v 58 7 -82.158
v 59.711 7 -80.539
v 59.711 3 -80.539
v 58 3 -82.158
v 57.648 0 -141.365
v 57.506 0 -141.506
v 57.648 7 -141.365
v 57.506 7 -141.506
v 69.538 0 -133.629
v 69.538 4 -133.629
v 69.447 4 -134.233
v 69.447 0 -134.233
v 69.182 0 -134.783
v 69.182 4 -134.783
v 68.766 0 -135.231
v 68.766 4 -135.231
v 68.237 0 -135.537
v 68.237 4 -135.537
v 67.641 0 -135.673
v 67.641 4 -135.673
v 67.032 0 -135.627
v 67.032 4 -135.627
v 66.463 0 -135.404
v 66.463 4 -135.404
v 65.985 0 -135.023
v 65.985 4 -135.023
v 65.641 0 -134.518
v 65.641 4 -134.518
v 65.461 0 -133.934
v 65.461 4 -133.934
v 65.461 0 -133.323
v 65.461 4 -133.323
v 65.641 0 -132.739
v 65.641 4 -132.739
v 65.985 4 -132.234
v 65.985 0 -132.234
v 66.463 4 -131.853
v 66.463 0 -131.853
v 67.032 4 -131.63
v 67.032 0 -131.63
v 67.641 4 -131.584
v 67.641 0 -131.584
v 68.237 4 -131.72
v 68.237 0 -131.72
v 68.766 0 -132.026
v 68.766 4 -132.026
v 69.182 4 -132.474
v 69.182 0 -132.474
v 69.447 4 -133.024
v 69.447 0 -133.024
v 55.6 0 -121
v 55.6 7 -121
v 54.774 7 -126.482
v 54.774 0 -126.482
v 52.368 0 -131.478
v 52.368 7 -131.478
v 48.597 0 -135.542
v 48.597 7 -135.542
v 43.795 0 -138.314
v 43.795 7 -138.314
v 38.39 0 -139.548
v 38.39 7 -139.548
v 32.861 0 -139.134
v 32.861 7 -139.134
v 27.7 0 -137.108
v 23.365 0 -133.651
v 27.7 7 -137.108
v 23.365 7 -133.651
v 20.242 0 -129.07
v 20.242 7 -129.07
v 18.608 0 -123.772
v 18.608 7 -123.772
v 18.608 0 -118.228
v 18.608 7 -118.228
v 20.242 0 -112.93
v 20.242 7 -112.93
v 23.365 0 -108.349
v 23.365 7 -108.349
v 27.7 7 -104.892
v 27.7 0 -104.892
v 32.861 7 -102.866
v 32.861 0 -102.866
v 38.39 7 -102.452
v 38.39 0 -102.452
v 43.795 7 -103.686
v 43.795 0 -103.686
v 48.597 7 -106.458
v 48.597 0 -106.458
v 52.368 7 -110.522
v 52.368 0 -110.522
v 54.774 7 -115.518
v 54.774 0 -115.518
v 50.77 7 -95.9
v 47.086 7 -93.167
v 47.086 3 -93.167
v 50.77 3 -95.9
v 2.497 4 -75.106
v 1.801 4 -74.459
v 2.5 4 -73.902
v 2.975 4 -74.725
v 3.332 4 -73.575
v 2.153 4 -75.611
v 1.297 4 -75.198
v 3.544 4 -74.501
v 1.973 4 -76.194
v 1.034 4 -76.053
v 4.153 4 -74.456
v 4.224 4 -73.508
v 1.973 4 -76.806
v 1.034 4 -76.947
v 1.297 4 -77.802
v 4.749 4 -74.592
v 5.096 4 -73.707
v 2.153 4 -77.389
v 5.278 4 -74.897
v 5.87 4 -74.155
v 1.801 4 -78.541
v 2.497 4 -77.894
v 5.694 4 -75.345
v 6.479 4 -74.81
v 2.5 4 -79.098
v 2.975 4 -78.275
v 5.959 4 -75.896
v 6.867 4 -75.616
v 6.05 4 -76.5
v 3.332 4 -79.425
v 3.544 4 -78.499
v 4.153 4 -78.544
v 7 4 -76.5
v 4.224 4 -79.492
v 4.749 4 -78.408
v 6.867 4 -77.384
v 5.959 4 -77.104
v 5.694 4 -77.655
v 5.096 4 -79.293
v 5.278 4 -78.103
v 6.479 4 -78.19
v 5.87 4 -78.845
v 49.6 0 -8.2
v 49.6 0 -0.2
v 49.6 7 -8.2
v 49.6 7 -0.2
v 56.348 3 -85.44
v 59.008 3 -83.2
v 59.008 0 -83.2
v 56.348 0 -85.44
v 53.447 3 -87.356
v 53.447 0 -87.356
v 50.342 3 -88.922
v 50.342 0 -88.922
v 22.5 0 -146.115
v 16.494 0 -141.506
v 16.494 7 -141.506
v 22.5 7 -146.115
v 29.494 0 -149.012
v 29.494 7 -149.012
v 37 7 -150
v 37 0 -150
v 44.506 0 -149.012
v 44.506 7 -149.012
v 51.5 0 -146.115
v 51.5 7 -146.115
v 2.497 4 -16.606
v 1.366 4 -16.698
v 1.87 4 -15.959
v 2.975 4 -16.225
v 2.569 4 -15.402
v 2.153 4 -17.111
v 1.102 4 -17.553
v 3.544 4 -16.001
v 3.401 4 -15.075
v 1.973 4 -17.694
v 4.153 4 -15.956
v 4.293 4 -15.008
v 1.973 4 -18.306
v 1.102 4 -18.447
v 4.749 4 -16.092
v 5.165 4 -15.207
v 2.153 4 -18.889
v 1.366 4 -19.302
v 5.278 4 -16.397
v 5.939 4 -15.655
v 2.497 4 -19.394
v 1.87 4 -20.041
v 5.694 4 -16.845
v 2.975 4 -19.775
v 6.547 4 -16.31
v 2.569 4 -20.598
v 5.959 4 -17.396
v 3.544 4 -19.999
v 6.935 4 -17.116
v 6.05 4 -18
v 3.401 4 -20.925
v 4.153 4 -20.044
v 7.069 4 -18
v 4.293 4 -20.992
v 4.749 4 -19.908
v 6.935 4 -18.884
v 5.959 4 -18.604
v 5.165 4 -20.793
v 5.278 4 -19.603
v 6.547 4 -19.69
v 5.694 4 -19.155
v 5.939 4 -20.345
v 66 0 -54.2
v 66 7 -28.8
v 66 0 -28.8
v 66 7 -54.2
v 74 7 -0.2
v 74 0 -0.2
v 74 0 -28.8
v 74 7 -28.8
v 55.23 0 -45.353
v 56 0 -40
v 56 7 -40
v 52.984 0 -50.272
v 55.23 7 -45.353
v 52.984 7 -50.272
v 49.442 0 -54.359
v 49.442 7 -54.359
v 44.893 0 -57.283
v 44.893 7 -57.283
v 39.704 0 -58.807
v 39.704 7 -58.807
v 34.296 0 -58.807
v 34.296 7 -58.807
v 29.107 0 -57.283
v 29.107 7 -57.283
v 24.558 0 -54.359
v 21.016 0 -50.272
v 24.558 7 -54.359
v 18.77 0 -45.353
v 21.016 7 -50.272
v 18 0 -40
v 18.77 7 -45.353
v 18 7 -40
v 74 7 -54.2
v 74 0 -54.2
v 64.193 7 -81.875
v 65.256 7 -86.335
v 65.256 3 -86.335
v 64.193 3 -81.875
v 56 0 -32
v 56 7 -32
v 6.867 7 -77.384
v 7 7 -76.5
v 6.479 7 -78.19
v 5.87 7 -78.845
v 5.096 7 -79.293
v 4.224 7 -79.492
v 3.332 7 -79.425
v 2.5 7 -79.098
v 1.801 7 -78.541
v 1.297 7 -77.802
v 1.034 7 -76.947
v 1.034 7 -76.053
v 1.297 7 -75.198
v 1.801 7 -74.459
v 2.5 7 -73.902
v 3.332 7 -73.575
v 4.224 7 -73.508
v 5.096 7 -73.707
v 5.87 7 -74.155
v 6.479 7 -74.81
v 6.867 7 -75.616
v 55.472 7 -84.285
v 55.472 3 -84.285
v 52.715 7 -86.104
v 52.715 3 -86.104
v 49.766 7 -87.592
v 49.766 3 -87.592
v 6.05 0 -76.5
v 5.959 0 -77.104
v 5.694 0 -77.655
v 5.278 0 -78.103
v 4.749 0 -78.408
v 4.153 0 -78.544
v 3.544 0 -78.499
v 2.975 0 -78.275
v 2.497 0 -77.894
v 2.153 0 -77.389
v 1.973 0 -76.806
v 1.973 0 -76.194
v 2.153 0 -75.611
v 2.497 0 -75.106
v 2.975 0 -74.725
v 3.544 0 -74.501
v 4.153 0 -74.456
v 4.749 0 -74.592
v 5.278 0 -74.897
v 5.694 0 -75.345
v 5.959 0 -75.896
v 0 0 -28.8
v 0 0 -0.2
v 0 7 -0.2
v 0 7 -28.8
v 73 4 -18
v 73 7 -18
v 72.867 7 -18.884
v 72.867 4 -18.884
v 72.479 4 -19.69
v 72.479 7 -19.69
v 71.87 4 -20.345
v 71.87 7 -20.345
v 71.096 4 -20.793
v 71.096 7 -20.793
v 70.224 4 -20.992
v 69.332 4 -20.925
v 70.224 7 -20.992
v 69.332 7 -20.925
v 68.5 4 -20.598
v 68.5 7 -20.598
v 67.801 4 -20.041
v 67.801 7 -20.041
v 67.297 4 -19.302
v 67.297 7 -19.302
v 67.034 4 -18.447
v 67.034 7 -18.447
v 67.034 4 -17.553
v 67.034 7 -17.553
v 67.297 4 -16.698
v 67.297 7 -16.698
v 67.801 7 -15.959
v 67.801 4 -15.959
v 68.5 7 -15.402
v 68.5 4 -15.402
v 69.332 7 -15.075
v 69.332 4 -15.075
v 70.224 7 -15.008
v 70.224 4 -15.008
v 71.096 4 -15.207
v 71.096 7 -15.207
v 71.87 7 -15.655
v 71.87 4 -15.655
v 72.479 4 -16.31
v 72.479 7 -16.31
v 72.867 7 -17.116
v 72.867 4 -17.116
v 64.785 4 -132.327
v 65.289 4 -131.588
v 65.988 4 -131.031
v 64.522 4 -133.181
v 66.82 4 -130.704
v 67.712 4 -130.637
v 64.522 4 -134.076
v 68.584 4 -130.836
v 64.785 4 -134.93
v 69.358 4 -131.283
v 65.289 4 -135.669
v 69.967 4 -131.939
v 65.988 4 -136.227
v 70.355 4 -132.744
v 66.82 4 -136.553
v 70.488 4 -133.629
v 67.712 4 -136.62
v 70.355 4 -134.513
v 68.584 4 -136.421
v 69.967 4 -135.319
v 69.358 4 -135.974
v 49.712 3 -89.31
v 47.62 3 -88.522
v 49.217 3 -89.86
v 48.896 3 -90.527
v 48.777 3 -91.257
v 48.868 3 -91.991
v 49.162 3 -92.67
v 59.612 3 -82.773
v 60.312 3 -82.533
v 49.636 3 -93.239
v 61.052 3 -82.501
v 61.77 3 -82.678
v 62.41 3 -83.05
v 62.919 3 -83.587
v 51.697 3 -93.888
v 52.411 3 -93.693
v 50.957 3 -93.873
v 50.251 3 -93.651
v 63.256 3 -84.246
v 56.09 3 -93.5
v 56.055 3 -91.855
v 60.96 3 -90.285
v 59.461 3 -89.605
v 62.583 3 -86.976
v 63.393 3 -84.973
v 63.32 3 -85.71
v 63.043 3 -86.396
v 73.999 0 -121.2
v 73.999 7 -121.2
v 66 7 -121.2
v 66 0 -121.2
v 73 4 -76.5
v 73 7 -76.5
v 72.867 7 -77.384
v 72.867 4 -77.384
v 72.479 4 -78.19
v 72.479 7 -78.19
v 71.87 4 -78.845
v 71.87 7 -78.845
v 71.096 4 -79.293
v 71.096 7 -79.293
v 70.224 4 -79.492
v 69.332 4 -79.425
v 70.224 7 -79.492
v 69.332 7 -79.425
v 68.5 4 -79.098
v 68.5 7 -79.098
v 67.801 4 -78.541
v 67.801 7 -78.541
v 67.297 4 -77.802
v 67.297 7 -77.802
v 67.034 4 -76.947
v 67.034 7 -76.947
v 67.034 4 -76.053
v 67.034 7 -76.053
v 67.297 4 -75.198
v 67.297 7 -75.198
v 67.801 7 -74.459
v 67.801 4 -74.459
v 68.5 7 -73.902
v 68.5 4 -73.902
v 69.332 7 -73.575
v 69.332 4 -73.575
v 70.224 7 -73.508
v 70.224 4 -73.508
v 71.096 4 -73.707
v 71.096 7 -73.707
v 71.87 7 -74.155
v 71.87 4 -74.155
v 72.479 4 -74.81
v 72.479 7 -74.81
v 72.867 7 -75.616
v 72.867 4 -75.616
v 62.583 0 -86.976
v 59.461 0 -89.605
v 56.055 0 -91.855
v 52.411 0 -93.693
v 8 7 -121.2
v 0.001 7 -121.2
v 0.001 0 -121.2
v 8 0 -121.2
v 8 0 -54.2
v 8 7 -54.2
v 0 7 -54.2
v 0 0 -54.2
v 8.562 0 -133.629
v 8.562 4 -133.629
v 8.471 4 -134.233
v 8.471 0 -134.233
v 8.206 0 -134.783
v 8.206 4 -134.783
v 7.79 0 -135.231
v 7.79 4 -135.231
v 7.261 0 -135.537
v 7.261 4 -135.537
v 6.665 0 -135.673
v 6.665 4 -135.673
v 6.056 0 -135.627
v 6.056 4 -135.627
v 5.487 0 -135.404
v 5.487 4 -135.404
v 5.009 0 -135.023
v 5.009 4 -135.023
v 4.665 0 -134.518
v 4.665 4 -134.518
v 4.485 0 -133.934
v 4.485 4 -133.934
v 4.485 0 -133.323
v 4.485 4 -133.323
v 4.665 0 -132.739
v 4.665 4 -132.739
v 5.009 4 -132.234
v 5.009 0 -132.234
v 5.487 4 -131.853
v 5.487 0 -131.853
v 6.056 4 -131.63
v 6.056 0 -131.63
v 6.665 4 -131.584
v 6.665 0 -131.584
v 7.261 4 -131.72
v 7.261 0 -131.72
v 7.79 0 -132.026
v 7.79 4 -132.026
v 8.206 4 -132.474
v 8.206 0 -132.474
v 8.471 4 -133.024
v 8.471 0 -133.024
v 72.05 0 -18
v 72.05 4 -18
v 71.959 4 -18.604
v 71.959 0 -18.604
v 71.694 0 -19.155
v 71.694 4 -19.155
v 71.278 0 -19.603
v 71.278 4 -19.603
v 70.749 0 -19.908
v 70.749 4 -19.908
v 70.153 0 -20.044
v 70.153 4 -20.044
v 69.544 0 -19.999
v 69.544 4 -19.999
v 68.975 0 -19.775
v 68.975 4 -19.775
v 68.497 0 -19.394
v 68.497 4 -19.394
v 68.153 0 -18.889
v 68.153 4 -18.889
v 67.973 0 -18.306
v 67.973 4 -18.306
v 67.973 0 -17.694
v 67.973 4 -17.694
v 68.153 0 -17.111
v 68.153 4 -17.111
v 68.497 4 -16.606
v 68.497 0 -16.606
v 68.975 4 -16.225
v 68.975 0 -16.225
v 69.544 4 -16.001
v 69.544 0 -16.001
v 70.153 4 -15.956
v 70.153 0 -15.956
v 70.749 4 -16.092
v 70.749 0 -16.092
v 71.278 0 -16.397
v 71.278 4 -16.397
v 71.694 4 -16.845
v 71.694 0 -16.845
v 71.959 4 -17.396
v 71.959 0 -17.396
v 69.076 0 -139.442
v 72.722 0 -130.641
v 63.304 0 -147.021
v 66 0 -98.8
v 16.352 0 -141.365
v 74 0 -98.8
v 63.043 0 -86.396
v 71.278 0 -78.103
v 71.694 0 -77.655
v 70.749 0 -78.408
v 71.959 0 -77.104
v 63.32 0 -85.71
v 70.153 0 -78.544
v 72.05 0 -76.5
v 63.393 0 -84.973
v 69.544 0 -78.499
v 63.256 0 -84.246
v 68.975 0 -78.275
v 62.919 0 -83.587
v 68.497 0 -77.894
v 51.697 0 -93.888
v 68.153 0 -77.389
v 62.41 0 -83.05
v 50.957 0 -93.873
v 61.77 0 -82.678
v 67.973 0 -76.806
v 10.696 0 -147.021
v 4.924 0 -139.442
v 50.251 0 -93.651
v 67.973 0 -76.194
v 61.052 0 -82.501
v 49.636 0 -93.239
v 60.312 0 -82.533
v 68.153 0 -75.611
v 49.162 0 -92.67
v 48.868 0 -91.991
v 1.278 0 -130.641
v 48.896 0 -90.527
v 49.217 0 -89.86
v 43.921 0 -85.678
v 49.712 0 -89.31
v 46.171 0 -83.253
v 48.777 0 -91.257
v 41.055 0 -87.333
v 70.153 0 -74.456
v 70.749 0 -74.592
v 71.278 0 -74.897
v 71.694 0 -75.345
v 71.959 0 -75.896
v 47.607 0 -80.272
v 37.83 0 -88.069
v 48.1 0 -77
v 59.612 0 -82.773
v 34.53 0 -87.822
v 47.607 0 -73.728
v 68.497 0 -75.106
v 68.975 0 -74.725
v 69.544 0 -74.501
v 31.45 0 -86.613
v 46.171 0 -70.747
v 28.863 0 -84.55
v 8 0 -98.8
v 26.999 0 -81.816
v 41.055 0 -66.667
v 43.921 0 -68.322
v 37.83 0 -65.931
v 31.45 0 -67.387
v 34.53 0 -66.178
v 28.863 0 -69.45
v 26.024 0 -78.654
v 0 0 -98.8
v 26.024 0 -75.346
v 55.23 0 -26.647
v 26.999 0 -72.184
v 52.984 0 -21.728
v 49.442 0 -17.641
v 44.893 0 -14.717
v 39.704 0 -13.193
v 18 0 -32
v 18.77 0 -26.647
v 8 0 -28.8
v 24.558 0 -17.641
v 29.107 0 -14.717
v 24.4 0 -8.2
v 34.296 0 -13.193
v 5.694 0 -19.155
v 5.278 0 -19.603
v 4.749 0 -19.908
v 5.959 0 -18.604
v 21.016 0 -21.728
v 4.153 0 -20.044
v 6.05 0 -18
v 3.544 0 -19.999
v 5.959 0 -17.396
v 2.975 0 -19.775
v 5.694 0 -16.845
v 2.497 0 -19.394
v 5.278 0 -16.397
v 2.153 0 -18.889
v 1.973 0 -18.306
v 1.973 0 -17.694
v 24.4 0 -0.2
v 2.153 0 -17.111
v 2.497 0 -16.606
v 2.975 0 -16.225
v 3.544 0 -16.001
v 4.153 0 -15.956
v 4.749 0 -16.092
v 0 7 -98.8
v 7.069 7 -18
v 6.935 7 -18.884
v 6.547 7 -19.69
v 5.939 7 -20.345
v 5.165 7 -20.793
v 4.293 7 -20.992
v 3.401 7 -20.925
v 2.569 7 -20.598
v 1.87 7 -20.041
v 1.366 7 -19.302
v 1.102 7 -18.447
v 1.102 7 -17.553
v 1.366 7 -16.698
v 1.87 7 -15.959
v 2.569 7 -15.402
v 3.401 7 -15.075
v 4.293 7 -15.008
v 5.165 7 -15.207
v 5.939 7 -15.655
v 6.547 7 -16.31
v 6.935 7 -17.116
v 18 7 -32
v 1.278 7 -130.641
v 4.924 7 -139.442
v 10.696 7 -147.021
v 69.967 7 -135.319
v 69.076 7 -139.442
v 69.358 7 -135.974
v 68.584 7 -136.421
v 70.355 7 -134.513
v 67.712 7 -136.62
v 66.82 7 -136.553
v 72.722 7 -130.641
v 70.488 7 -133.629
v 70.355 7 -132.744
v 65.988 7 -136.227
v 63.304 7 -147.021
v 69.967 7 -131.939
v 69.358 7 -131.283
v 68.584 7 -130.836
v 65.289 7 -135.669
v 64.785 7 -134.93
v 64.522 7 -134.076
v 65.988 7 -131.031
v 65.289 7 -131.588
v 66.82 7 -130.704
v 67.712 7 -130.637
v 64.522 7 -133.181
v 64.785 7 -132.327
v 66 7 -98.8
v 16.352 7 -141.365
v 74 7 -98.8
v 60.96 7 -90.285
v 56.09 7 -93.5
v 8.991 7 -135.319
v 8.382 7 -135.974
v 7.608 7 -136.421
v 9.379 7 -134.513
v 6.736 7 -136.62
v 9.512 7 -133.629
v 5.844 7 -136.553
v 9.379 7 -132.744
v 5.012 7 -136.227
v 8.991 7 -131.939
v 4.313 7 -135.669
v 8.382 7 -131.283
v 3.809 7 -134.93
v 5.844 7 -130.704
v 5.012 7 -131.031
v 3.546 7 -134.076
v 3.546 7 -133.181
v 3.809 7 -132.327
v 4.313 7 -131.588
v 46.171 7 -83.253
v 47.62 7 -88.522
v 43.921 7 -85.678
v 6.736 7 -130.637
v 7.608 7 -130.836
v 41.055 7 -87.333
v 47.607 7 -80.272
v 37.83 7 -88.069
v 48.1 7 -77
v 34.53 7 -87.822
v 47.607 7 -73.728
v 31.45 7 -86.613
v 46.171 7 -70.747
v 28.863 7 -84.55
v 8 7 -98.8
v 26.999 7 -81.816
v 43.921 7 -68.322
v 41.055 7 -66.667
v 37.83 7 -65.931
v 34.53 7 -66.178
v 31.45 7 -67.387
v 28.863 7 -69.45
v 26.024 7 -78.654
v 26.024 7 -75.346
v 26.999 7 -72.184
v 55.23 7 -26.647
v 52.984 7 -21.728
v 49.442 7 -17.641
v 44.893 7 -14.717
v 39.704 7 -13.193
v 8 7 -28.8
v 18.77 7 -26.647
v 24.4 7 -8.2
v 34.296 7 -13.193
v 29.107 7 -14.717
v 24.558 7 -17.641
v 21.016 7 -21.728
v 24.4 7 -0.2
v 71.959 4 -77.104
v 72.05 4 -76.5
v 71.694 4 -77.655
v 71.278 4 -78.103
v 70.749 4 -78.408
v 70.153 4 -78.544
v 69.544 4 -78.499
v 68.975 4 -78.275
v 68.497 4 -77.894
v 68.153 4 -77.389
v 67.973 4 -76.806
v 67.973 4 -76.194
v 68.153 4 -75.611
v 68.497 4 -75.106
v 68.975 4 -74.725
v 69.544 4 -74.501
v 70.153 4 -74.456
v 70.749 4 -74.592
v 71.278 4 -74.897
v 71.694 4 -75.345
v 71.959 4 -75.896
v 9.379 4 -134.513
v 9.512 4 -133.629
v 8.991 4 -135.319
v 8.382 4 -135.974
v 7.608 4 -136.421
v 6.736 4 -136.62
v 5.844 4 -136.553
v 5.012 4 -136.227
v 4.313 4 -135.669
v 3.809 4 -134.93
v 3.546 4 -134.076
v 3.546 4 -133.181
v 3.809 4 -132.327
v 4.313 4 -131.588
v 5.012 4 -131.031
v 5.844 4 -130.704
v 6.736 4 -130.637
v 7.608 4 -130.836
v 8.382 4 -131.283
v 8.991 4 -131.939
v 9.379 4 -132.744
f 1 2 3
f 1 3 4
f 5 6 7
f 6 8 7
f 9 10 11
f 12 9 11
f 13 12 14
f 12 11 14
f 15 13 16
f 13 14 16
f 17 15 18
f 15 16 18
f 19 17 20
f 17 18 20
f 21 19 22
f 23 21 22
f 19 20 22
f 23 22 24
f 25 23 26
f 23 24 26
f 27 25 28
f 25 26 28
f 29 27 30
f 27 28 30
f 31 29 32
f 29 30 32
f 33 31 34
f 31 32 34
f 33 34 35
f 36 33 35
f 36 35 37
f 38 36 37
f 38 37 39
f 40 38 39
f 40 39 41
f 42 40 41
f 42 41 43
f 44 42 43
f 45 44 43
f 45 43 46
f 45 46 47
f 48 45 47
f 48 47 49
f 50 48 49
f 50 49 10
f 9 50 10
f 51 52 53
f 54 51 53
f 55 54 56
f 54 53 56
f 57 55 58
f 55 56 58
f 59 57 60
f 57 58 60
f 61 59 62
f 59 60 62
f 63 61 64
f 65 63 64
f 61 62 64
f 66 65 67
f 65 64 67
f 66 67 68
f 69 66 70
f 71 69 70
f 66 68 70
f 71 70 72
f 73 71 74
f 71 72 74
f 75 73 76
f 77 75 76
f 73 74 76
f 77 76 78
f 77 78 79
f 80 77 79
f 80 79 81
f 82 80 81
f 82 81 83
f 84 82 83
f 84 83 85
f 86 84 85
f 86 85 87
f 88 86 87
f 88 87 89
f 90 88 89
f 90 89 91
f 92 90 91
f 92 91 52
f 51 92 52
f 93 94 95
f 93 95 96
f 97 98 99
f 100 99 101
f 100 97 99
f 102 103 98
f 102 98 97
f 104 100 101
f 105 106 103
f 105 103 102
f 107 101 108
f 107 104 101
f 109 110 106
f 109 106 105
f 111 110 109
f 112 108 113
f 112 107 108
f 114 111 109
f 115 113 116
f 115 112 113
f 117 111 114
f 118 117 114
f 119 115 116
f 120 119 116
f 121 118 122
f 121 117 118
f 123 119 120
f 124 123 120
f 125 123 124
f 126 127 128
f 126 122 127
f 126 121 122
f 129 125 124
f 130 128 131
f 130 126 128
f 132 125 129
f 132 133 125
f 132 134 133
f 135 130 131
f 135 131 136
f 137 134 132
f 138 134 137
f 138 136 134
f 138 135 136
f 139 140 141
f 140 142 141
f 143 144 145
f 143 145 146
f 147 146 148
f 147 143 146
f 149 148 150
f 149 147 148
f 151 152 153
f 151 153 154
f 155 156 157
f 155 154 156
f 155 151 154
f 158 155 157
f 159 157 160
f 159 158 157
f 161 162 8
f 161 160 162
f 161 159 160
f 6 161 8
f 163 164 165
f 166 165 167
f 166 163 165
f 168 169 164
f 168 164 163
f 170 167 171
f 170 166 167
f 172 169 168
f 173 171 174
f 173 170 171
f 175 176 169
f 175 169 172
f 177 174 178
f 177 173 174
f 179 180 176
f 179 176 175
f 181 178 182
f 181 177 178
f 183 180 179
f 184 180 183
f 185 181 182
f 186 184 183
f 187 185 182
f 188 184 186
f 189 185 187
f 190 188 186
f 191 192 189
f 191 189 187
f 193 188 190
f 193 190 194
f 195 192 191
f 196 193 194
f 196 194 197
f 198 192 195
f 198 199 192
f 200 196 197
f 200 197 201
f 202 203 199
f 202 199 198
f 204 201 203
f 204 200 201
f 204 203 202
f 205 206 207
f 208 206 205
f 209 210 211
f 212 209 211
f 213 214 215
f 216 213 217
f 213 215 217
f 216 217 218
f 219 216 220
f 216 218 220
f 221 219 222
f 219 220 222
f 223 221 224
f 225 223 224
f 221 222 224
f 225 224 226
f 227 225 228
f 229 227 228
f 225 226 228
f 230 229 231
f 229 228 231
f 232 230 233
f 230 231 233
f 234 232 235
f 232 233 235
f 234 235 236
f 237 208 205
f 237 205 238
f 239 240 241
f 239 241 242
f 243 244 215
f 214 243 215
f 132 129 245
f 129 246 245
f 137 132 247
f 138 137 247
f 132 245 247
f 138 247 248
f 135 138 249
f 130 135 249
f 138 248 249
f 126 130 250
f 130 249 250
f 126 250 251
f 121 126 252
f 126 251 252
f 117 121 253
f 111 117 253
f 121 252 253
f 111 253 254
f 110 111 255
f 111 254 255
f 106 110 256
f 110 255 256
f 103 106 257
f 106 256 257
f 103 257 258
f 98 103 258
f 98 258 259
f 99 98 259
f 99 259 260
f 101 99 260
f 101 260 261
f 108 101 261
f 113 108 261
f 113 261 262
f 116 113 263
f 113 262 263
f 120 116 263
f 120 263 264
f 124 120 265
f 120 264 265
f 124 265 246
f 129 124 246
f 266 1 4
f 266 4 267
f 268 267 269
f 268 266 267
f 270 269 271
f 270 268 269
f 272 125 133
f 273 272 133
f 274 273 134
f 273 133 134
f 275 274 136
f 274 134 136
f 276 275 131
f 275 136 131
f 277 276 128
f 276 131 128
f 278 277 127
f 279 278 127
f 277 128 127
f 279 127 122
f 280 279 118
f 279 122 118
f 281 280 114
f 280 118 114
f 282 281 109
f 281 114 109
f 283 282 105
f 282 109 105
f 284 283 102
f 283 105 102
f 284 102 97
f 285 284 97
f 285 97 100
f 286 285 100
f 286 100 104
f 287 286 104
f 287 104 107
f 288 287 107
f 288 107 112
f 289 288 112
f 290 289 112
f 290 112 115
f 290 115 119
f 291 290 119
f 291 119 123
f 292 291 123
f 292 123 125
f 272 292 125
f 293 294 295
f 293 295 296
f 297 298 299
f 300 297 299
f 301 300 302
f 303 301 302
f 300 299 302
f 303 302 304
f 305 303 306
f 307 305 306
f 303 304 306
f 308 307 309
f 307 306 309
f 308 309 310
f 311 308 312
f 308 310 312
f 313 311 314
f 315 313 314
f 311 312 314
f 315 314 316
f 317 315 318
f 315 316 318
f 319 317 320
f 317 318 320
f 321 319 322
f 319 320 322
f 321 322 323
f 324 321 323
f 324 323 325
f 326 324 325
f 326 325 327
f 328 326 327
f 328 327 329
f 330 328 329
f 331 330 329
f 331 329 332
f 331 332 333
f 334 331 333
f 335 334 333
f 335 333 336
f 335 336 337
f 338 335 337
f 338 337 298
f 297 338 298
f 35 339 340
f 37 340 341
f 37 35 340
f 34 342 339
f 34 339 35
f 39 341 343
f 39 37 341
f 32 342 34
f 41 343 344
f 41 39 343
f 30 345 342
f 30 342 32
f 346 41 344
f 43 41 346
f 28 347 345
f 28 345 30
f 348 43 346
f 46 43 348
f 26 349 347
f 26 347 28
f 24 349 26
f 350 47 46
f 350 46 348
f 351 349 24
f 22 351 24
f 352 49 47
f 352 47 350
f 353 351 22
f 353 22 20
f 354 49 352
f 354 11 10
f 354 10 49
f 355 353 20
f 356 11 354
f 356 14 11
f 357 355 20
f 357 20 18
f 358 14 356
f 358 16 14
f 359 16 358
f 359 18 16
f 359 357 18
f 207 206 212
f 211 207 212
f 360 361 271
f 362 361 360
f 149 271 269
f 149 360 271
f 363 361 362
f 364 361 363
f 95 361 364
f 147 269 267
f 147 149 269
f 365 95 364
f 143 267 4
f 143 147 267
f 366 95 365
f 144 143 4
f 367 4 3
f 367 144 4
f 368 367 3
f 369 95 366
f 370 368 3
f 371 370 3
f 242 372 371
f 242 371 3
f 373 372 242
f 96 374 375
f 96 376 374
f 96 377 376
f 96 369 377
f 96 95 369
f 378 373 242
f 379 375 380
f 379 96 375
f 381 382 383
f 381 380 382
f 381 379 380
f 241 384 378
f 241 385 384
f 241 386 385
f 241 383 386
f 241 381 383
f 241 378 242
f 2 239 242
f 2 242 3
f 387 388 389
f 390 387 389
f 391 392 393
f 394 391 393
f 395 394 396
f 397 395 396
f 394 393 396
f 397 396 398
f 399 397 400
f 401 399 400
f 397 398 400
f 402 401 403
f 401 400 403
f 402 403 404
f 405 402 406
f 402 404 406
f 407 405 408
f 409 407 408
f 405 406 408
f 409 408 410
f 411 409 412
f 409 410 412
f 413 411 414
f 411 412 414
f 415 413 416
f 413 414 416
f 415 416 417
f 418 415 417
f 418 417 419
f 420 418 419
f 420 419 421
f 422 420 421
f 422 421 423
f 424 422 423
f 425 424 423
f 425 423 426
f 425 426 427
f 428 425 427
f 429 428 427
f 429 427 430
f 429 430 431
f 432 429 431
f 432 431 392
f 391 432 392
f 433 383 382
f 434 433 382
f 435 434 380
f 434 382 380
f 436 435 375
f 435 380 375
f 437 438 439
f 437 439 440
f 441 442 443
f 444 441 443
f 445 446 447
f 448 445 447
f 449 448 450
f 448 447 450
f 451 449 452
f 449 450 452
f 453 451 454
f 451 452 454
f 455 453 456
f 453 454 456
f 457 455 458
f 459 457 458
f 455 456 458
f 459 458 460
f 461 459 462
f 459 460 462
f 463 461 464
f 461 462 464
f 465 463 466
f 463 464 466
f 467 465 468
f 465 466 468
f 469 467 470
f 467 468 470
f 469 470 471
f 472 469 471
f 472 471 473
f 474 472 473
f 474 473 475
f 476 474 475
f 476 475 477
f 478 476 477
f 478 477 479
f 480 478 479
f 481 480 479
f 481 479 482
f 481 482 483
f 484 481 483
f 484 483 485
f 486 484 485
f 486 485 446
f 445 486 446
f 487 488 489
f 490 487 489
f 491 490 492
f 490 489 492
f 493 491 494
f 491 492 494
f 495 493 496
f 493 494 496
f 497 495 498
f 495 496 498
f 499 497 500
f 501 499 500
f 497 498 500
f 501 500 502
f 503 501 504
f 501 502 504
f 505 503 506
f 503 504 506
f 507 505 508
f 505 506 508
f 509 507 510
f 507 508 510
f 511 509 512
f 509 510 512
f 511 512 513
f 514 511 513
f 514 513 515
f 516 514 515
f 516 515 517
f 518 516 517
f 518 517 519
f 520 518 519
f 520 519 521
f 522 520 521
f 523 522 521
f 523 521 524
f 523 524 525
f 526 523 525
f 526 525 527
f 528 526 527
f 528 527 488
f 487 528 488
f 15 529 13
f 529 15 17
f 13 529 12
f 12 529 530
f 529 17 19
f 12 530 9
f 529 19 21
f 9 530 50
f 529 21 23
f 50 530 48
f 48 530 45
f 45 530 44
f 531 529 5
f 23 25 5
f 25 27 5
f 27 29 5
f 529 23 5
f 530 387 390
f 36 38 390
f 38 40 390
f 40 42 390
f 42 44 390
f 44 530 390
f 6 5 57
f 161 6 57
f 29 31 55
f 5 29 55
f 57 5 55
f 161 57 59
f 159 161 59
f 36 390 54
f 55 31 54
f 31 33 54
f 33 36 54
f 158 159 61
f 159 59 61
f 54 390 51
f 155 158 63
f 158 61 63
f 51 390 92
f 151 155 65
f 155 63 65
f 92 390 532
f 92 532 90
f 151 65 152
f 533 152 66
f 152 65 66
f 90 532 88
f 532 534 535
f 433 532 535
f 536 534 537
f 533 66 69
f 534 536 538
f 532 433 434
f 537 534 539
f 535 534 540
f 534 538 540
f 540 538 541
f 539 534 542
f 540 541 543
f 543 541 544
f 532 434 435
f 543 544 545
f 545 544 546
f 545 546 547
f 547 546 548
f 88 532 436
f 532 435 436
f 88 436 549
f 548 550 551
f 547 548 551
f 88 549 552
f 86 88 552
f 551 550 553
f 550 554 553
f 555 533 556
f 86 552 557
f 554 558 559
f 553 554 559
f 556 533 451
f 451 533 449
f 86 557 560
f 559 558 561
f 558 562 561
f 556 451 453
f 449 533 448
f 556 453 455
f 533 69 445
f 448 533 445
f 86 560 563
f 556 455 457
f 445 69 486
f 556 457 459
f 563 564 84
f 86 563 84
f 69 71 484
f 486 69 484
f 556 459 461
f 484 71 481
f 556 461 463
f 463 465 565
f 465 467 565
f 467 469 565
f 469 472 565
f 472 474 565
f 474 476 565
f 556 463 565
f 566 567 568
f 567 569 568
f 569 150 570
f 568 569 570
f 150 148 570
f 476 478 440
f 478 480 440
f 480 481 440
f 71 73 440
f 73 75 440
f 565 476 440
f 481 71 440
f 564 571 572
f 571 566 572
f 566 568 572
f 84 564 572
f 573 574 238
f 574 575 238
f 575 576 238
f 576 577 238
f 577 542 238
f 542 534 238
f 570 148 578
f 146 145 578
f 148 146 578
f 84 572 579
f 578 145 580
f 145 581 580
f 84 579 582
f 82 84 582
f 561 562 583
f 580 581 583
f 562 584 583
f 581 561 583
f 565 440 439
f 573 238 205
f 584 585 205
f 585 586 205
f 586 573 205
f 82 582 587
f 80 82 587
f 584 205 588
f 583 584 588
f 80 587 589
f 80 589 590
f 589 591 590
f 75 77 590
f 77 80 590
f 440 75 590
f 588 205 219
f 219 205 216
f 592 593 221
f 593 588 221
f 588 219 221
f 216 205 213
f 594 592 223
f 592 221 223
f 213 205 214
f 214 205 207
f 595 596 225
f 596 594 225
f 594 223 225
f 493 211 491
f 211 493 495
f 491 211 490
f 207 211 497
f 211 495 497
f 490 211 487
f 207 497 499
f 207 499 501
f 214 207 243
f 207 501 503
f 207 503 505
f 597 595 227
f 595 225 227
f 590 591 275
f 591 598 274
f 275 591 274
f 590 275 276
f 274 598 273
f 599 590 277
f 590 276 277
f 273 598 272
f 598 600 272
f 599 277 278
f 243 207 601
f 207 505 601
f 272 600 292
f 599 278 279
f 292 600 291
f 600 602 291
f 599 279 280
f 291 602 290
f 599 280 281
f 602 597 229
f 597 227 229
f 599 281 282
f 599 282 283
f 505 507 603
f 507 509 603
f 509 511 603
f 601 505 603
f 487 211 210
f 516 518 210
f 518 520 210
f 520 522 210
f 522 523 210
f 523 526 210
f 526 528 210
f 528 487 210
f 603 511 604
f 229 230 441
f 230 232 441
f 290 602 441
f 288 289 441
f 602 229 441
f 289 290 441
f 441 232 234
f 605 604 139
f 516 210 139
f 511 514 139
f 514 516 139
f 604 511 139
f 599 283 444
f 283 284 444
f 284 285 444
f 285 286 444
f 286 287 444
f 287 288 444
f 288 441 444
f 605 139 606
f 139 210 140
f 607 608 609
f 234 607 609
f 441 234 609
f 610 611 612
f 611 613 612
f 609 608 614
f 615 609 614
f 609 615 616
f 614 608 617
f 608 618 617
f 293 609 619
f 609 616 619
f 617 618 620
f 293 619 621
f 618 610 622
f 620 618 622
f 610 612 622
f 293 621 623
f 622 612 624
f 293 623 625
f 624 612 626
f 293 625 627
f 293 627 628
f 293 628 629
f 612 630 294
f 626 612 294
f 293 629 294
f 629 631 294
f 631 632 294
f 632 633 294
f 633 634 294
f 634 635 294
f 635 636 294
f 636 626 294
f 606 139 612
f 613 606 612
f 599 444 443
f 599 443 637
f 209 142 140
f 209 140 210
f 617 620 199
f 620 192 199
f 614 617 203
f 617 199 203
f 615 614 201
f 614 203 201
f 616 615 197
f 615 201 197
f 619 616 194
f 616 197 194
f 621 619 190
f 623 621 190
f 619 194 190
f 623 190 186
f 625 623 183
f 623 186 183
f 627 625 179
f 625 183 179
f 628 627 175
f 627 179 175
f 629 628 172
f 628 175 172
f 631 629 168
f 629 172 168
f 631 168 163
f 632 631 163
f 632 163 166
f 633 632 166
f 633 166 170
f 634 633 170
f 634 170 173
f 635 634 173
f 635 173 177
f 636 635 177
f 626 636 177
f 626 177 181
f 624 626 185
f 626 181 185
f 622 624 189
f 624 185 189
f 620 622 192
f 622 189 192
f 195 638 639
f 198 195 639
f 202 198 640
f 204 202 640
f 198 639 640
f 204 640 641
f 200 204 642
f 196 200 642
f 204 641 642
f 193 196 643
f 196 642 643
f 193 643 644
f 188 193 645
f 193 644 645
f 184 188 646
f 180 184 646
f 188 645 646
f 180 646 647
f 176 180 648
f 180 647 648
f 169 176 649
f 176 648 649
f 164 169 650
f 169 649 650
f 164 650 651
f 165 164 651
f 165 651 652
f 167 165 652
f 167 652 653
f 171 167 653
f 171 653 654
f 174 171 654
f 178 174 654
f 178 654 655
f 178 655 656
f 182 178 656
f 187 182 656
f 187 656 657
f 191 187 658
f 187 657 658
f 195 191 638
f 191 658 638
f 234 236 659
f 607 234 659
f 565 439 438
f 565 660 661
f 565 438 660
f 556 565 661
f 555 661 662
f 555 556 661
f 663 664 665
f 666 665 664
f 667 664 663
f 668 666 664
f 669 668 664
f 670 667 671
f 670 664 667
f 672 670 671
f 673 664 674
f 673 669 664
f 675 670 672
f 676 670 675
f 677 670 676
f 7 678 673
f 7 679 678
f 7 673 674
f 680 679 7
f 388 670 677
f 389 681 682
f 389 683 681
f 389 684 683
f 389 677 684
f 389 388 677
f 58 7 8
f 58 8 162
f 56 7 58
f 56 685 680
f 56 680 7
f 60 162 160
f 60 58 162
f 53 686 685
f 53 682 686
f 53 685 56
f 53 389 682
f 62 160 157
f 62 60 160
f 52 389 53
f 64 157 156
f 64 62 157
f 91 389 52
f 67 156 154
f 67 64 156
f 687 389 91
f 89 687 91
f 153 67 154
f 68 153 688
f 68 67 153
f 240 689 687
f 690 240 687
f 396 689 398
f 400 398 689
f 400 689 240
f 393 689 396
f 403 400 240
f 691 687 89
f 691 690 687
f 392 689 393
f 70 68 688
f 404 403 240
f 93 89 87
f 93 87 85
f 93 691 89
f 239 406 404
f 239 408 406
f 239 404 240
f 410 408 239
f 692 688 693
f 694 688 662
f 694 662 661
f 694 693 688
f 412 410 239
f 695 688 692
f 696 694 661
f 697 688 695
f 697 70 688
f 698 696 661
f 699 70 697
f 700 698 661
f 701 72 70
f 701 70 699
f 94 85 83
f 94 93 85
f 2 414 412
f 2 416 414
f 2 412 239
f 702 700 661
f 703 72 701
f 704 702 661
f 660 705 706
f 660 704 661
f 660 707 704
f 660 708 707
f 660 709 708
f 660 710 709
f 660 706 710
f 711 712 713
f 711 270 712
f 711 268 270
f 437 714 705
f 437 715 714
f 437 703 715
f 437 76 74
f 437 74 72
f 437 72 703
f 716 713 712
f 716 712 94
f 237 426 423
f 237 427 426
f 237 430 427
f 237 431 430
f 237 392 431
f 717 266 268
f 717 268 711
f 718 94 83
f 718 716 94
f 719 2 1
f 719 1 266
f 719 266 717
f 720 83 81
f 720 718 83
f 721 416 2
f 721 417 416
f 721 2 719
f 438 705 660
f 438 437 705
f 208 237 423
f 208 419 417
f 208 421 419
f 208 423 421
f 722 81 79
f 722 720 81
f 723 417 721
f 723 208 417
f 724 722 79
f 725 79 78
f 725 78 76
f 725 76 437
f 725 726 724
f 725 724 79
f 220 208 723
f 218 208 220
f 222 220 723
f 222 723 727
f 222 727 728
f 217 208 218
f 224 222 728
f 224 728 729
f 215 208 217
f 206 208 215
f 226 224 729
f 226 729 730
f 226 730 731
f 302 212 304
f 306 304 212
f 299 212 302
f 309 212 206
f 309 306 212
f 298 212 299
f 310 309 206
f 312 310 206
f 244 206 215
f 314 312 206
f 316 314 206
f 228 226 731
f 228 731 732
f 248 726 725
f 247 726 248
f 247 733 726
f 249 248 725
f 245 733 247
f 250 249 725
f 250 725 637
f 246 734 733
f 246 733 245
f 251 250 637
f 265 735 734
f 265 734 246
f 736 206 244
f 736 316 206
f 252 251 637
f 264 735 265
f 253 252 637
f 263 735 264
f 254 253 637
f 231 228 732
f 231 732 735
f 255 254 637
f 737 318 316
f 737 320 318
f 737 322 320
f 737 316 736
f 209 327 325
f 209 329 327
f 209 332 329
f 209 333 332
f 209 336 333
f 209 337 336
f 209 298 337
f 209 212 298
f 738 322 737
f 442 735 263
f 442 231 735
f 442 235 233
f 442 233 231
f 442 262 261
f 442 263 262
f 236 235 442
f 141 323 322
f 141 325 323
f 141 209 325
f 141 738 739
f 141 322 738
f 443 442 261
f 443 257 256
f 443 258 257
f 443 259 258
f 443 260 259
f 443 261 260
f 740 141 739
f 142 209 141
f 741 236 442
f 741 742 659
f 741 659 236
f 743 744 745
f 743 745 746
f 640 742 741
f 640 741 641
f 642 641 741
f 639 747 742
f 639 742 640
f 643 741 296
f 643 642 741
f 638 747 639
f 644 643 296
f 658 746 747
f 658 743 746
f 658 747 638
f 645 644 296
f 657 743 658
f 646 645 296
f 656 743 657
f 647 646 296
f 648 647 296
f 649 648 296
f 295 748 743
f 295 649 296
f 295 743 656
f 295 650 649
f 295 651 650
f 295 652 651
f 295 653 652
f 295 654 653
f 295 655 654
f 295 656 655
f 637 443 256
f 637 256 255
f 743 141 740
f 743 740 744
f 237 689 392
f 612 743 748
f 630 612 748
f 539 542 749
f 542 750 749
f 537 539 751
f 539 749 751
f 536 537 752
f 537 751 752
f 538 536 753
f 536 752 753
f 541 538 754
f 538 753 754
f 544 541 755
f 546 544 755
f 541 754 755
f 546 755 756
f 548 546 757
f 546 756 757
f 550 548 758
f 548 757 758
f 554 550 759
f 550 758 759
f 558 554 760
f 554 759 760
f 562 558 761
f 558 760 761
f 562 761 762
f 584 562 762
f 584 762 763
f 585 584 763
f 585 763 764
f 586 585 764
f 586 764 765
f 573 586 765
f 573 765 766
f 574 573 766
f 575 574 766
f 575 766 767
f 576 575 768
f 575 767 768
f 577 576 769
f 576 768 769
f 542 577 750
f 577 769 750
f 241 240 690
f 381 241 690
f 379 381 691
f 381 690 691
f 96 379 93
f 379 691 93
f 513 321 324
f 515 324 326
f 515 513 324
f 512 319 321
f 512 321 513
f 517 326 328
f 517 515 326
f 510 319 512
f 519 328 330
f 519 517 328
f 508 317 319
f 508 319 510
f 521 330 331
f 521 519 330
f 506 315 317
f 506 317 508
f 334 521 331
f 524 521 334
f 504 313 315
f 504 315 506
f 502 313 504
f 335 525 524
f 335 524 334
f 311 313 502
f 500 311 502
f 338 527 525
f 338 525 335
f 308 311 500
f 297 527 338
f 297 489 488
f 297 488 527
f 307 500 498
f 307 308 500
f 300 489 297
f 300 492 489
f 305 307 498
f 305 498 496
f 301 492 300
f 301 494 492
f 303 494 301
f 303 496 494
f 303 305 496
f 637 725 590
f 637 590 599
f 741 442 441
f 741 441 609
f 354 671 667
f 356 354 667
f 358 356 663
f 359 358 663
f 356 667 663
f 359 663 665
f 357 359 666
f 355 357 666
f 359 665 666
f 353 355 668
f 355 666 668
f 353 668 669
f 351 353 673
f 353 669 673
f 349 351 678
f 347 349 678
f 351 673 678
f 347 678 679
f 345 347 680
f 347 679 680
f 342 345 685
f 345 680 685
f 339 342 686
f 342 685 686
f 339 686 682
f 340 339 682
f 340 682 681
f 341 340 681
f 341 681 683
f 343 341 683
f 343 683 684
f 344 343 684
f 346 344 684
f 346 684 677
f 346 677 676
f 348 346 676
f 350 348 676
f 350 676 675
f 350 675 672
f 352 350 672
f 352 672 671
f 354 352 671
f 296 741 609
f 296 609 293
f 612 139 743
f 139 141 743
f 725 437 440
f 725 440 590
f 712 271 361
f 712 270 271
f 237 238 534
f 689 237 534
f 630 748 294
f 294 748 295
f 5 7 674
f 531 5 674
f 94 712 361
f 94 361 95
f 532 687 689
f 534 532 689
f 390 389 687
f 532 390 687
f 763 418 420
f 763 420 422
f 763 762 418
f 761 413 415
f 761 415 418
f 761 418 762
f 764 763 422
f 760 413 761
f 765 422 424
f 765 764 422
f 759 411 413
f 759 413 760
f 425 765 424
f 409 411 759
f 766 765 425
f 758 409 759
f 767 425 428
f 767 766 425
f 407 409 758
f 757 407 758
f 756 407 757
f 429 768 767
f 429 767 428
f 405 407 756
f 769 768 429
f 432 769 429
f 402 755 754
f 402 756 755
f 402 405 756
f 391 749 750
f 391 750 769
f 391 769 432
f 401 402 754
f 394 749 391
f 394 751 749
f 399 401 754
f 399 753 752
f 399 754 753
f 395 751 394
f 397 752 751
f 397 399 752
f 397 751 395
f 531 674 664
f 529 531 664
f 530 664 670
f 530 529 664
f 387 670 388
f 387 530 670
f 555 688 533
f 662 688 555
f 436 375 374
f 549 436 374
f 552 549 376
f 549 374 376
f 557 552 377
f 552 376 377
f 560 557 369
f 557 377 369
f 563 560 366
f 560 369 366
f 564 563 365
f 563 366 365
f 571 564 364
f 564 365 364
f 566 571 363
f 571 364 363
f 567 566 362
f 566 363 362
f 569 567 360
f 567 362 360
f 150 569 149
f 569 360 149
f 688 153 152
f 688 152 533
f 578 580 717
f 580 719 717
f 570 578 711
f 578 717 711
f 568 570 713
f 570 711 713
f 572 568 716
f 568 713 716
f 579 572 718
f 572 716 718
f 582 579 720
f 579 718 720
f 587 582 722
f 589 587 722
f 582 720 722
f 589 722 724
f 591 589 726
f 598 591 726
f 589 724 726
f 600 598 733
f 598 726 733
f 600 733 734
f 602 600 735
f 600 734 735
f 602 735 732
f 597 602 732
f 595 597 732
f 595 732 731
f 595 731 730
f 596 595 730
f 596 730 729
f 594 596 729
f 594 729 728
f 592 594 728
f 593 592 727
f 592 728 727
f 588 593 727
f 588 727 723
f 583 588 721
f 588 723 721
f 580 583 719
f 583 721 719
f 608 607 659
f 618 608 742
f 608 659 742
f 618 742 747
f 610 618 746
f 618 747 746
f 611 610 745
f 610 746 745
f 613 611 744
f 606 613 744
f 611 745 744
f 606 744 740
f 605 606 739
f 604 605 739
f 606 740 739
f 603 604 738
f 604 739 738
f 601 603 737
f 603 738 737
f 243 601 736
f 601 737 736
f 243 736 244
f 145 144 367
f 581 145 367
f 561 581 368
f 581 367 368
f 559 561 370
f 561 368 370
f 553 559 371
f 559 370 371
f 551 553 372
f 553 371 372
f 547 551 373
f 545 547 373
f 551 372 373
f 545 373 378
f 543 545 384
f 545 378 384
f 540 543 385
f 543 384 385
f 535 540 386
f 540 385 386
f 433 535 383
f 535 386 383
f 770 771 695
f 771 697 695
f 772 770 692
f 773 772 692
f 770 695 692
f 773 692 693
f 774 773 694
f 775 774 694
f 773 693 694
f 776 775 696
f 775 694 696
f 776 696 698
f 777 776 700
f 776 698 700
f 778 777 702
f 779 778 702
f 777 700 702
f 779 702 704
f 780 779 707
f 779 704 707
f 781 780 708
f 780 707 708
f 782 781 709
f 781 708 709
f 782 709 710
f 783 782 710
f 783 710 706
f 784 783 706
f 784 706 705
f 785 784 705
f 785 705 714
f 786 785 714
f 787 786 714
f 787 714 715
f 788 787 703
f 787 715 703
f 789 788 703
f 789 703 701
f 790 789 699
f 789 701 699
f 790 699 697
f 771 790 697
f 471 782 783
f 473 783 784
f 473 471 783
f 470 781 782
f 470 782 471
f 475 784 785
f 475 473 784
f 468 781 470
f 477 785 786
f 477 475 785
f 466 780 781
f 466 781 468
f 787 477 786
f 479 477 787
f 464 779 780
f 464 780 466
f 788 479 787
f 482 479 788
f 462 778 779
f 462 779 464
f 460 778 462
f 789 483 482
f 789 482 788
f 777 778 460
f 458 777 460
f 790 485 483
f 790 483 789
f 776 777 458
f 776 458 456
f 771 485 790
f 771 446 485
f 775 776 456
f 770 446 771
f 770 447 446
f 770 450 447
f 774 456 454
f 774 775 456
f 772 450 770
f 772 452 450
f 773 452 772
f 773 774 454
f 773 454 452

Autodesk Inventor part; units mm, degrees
ref_plane "YZ Plane" through (0, 0, 0) normal (1, 0, 0) x (0, 1, 0)
ref_plane "XZ Plane" through (0, 0, 0) normal (0, 1, 0) x (-1, 0, 0)
ref_plane "XY Plane" through (0, 0, 0) normal (0, 0, 1) x (1, 0, 0)
sketch "Boceto1" plane through (0, 0, 0) normal (0, 1, 0) x (-1, 0, 0)
  line L0 (0, 0) -> (-24.6, 0)
  line L1 (0, 0) -> (0, -29)
  line L2 (0, -29) -> (-8, -29)
  line L3 (-8, -29) -> (-8, -54)
  line L4 (-8, -54) -> (0, -54)
  line L5 (0, -54) -> (0, -99)
  line L6 (0, -99) -> (-8, -99)
  line L7 (-8, -99) -> (-8, -121)
  line L8 (-8, -121) -> (0, -121)
  line L9 (-24.6, 0) -> (-24.6, -8)
  line L10 (-24.6, -8) -> (-49.4, -8)
  line L11 (-37, 21.7087) -> (-37, -150)
  arc A0 (-57.5061, -141.5061) -> (-16.4939, -141.5061) centre (-37, -121) ccw
  line L12 (-37, -121) -> (-16.4939, -141.5061)
  line L13 (-16.4939, -141.5061) -> (-10.837, -147.163)
  line L14 (-74, 0) -> (-49.4, 0)
  line L15 (-74, 0) -> (-74, -29)
  line L16 (-74, -29) -> (-66, -29)
  line L17 (-66, -29) -> (-66, -54)
  line L18 (-66, -54) -> (-74, -54)
  line L19 (-74, -54) -> (-74, -99)
  line L20 (-74, -99) -> (-66, -99)
  line L21 (-66, -99) -> (-66, -121)
  line L22 (-66, -121) -> (-74, -121)
  line L23 (-49.4, 0) -> (-49.4, -8)
  line L24 (-37, -121) -> (-57.5061, -141.5061)
  line L25 (-57.5061, -141.5061) -> (-63.163, -147.163)
  arc A1 (-74, -121) -> (-63.163, -147.163) centre (-37, -121) ccw
  arc A2 (-10.837, -147.163) -> (0, -121) centre (-37, -121) ccw
  dimension "d139" = 24.6
  dimension "d140" = 29
  dimension "d141" = 25
  dimension "d142" = 8
  dimension "d143" = 45
  dimension "d144" = 22
  dimension "d145" = 8
  dimension "d146" = 24.8
  dimension "d148" = 45
extrude "Extrusión1" add sketch "Boceto1" along normal blind 7
sketch "Boceto2" plane through (0, 7, 0) normal (0, 1, 0) x (1, 0, 0)
  arc A0 (18, 32) -> (56, 32) centre (37, 32) ccw
  arc A1 (56, 40) -> (18, 40) centre (37, 40) ccw
  line L0 (18, 40) -> (18, 32)
  line L1 (56, 32) -> (56, 40)
  circle A2 centre (37, 77) radius 11.1
  circle A3 centre (37, 121) radius 18.6
  line L2 (37, -3.2334) -> (37, 158.5758)
  point P0 (0, 0)
  dimension "d18" = 19
  dimension "d23" = 22.2
  dimension "d25" = 37.2
  dimension "d149" = 44
  dimension "d150" = 37
  dimension "d151" = 8
extrude "Extrusión2" cut sketch "Boceto2" against normal blind 7
sketch "Boceto3" plane through (0, 7, 0) normal (0, 1, 0) x (1, 0, 0)
  line L0 (37, -12.6618) -> (37, 178.5268)
  circle A0 centre (4, 18) radius 2.05
  circle A1 centre (4, 76.5) radius 2.05
  circle A2 centre (37, 121) radius 18.6 projected
  circle A3 centre (37, 121) radius 33
  circle A4 centre (6.512, 133.6286) radius 2.05
  line L1 (8, 29) -> (0, 29) projected
  line L2 (0, 29) -> (0, 0) projected
  line L3 (0, 99) -> (0, 54) projected
  line L4 (8, 99) -> (0, 99) projected
  line L5 (6.512, 133.6286) -> (37, 121)
  line L6 (24.8695, 121) -> (50.3921, 121)
  circle A5 centre (70, 18) radius 2.05
  circle A6 centre (70, 76.5) radius 2.05
  circle A7 centre (67.488, 133.6286) radius 2.05
  line L7 (67.488, 133.6286) -> (37, 121)
  dimension "d157" = 66
  dimension "d152" = 11
  dimension "d153" = 4
  dimension "d154" = 4.1
  dimension "d155" = 4
  dimension "d156" = 22.5
  dimension "d158" = 22.5
extrude "Extrusión3" cut sketch "Boceto3" against normal through all contours A4 A3 | A3 L5 A4 | A3 A4 L5 | A7 L7 A3 | A3 A7 | L7 A7 A3 | A0 | A1 | A5 | A6
sketch "Boceto12" plane through (0, 7, 0) normal (0, 1, 0) x (1, 0, 0)
  circle A0 centre (37, 77) radius 11.1 projected
  circle A1 centre (37, 121) radius 18.6 projected
  arc A2 (60.7956, 85.0881) -> (51.3765, 91.3074) centre (38.4503, 61.4886) ccw
  line L0 (38.4503, 61.4886) -> (60.7956, 85.0881)
  line L1 (38.4503, 61.4886) -> (51.3765, 91.3074)
  line L2 (51.3765, 91.3074) -> (52.4106, 93.693)
  line L3 (60.7956, 85.0881) -> (62.5832, 86.9761)
  line L4 (38.4503, 61.4886) -> (51.3765, 91.3074)
  line L5 (50.3411, 88.9225) -> (50.3424, 88.9219)
  line L6 (59.009, 83.1992) -> (59.008, 83.2002)
  circle A3 centre (51.3765, 91.3074) radius 2.6
  circle A4 centre (60.7956, 85.0881) radius 2.6
  circle A5 centre (38.4503, 61.4886) radius 29.9
  circle A6 centre (38.4503, 61.4886) radius 35.1
  point P0 (0, 0)
  point P1 (59.009, 83.1992)
  dimension "d101" = 0
  dimension "d102" = 20
  dimension "d91" = 65
  dimension "d173" = 5.2
  dimension "d174" = 5.2
extrude "Extrusión10" cut sketch "Boceto12" against normal through all contours A3 L2 L1 | L1 A2 A3 | A3 A2 A4 A5 | L2 A3 A2 | A6 A4 A2 A3 | A4 A2 L0 | L0 L3 A4 | L3 A2 A4
sketch "Boceto13" plane through (0, 7, 0) normal (0, 1, 0) x (1, 0, 0)
  line L0 (47.0857, 93.1674) -> (50.8419, 95.9533)
  line L1 (50.8419, 95.9533) -> (52.9888, 95.0227)
  line L2 (49.7657, 87.5915) -> (47.6203, 88.5215)
  line L3 (47.6203, 88.5215) -> (47.0857, 93.1674)
  line L4 (59.7114, 80.539) -> (57.9998, 82.1579)
  line L5 (63.5861, 88.0233) -> (65.2773, 86.4238)
  line L6 (65.2773, 86.4238) -> (64.1931, 81.8747)
  line L7 (64.1931, 81.8747) -> (59.7114, 80.539)
  circle A0 centre (38.4503, 61.4886) radius 28.45
  circle A1 centre (38.4503, 61.4886) radius 36.55
  point P0 (0, 0)
  point P1 (51.3765, 91.3074)
  point P2 (60.7956, 85.0881)
  point P3 (60.7956, 85.0881)
  point P4 (51.3765, 91.3074)
  point P5 (51.3765, 91.3074)
  point P6 (51.3765, 91.3074)
  point P7 (60.7956, 85.0881)
  point P8 (65.2562, 86.3351)
  point P9 (50.7698, 95.8998)
  dimension "d172" = 8.1
extrude "Extrusión11" cut sketch "Boceto13" against normal blind 4 contours L0 A1 L6 L7 L4 A0 L2 L3 picked at (62.116, 83.8351)
sketch "Boceto15" plane through (0, 7, 0) normal (0, 1, 0) x (1, 0, 0)
  circle A0 centre (4.0687, 18) radius 3
  circle A1 centre (4, 76.5) radius 2.05 projected
  circle A2 centre (4, 76.5) radius 3
  circle A3 centre (6.512, 133.6286) radius 2.05 projected
  circle A4 centre (6.512, 133.6286) radius 3
  circle A5 centre (67.488, 133.6286) radius 2.05 projected
  circle A6 centre (67.488, 133.6286) radius 3
  circle A7 centre (70, 76.5) radius 2.05 projected
  circle A8 centre (70, 76.5) radius 3
  circle A9 centre (70, 18) radius 2.05 projected
  circle A10 centre (70, 18) radius 3
  point P0 (0, 0)
  dimension "d159" = 6
  dimension "d160" = 6
  dimension "d161" = 6
  dimension "d162" = 6
  dimension "d163" = 6
  dimension "d164" = 6
extrude "Extrusión12" cut sketch "Boceto15" against normal blind 3 contours A0 | A1 | A2 | A3 | A4 | A5 | A6 | A7 | A8 | A9 | A10
sketch "Boceto16" plane through (0, 7, 0) normal (0, 1, 0) x (1, 0, 0)
  line L0 (0, 29) -> (0, 0) projected
  line L1 (0, 29) -> (8, 29)
  line L2 (8, 29) -> (8, 28.8)
  line L3 (8, 28.8) -> (0, 28.8)
  line L4 (0, 28.8) -> (0, 29)
  line L5 (0, 54) -> (8, 54) projected
  line L6 (0, 54) -> (8, 54)
  line L7 (8, 54) -> (8, 54.2)
  line L8 (8, 54.2) -> (0, 54.2)
  line L9 (0, 54.2) -> (0, 54)
  line L10 (8, 99) -> (0, 99) projected
  line L11 (0, 99) -> (8, 99)
  line L12 (8, 99) -> (8, 98.8)
  line L13 (8, 98.8) -> (0, 98.8)
  line L14 (0, 98.8) -> (0, 99)
  line L15 (8, 121) -> (8, 99) projected
  line L16 (8, 121) -> (0, 121)
  line L17 (0, 121) -> (0, 121.2)
  line L18 (0, 121.2) -> (8, 121.2)
  line L19 (8, 121.2) -> (8, 121)
  line L20 (16.4939, 141.5061) -> (10.837, 147.163) projected
  line L21 (16.4939, 141.5061) -> (16.3525, 141.3647)
  line L22 (16.3525, 141.3647) -> (10.6956, 147.0215)
  line L23 (10.6956, 147.0215) -> (10.837, 147.163)
  line L24 (24.6, 0) -> (24.6, 8) projected
  line L25 (0, 0) -> (24.6, 0)
  line L26 (24.6, 0) -> (24.6, 0.2)
  line L27 (24.6, 0.2) -> (0, 0.2)
  line L28 (0, 0.2) -> (0, 0)
  line L29 (24.6, 8) -> (49.4, 8) projected
  line L30 (24.6, 8) -> (24.4, 8)
  line L31 (24.4, 8) -> (24.4, 0)
  line L32 (24.4, 0) -> (24.6, 0)
  line L33 (24.6, 0) -> (24.6, 8)
  line L34 (37, -18.4316) -> (37, 165.7514)
  line L35 (74, 29) -> (74, 0)
  line L36 (74, 29) -> (66, 29)
  line L37 (66, 29) -> (66, 28.8)
  line L38 (66, 28.8) -> (74, 28.8)
  line L39 (74, 28.8) -> (74, 29)
  line L40 (74, 54) -> (66, 54)
  line L41 (74, 54) -> (66, 54)
  line L42 (66, 54) -> (66, 54.2)
  line L43 (66, 54.2) -> (74, 54.2)
  line L44 (74, 54.2) -> (74, 54)
  line L45 (66, 99) -> (74, 99)
  line L46 (74, 99) -> (66, 99)
  line L47 (66, 99) -> (66, 98.8)
  line L48 (66, 98.8) -> (74, 98.8)
  line L49 (74, 98.8) -> (74, 99)
  line L50 (66, 121) -> (66, 99)
  line L51 (66, 121) -> (74, 121)
  line L52 (74, 121) -> (74, 121.2)
  line L53 (74, 121.2) -> (66, 121.2)
  line L54 (66, 121.2) -> (66, 121)
  line L55 (57.5061, 141.5061) -> (63.163, 147.163)
  line L56 (57.5061, 141.5061) -> (57.6475, 141.3647)
  line L57 (57.6475, 141.3647) -> (63.3044, 147.0215)
  line L58 (63.3044, 147.0215) -> (63.163, 147.163)
  line L59 (49.4, 0) -> (49.4, 8)
  line L60 (74, 0) -> (49.4, 0)
  line L61 (49.4, 0) -> (49.4, 0.2)
  line L62 (49.4, 0.2) -> (74, 0.2)
  line L63 (74, 0.2) -> (74, 0)
  line L64 (49.4, 8) -> (49.6, 8)
  line L65 (49.6, 8) -> (49.6, 0)
  line L66 (49.6, 0) -> (49.4, 0)
  line L67 (49.4, 0) -> (49.4, 8)
  line L68 (24.4, 8) -> (49.6, 8)
  line L69 (49.6, 8) -> (49.6, 8.2)
  line L70 (49.6, 8.2) -> (24.4, 8.2)
  line L71 (24.4, 8.2) -> (24.4, 8)
  point P0 (24.4, 0.2)
  point P1 (0, 0.2)
  point P2 (49.6, 0.2)
  dimension "d166" = 8
  dimension "d167" = 0.2
  dimension "d168" = 0.2
  dimension "d169" = 0.2
extrude "Extrusión13" cut sketch "Boceto16" against normal through all
properties part number "Primer segmento - inferior v1.2" material "Plastico PETG"
